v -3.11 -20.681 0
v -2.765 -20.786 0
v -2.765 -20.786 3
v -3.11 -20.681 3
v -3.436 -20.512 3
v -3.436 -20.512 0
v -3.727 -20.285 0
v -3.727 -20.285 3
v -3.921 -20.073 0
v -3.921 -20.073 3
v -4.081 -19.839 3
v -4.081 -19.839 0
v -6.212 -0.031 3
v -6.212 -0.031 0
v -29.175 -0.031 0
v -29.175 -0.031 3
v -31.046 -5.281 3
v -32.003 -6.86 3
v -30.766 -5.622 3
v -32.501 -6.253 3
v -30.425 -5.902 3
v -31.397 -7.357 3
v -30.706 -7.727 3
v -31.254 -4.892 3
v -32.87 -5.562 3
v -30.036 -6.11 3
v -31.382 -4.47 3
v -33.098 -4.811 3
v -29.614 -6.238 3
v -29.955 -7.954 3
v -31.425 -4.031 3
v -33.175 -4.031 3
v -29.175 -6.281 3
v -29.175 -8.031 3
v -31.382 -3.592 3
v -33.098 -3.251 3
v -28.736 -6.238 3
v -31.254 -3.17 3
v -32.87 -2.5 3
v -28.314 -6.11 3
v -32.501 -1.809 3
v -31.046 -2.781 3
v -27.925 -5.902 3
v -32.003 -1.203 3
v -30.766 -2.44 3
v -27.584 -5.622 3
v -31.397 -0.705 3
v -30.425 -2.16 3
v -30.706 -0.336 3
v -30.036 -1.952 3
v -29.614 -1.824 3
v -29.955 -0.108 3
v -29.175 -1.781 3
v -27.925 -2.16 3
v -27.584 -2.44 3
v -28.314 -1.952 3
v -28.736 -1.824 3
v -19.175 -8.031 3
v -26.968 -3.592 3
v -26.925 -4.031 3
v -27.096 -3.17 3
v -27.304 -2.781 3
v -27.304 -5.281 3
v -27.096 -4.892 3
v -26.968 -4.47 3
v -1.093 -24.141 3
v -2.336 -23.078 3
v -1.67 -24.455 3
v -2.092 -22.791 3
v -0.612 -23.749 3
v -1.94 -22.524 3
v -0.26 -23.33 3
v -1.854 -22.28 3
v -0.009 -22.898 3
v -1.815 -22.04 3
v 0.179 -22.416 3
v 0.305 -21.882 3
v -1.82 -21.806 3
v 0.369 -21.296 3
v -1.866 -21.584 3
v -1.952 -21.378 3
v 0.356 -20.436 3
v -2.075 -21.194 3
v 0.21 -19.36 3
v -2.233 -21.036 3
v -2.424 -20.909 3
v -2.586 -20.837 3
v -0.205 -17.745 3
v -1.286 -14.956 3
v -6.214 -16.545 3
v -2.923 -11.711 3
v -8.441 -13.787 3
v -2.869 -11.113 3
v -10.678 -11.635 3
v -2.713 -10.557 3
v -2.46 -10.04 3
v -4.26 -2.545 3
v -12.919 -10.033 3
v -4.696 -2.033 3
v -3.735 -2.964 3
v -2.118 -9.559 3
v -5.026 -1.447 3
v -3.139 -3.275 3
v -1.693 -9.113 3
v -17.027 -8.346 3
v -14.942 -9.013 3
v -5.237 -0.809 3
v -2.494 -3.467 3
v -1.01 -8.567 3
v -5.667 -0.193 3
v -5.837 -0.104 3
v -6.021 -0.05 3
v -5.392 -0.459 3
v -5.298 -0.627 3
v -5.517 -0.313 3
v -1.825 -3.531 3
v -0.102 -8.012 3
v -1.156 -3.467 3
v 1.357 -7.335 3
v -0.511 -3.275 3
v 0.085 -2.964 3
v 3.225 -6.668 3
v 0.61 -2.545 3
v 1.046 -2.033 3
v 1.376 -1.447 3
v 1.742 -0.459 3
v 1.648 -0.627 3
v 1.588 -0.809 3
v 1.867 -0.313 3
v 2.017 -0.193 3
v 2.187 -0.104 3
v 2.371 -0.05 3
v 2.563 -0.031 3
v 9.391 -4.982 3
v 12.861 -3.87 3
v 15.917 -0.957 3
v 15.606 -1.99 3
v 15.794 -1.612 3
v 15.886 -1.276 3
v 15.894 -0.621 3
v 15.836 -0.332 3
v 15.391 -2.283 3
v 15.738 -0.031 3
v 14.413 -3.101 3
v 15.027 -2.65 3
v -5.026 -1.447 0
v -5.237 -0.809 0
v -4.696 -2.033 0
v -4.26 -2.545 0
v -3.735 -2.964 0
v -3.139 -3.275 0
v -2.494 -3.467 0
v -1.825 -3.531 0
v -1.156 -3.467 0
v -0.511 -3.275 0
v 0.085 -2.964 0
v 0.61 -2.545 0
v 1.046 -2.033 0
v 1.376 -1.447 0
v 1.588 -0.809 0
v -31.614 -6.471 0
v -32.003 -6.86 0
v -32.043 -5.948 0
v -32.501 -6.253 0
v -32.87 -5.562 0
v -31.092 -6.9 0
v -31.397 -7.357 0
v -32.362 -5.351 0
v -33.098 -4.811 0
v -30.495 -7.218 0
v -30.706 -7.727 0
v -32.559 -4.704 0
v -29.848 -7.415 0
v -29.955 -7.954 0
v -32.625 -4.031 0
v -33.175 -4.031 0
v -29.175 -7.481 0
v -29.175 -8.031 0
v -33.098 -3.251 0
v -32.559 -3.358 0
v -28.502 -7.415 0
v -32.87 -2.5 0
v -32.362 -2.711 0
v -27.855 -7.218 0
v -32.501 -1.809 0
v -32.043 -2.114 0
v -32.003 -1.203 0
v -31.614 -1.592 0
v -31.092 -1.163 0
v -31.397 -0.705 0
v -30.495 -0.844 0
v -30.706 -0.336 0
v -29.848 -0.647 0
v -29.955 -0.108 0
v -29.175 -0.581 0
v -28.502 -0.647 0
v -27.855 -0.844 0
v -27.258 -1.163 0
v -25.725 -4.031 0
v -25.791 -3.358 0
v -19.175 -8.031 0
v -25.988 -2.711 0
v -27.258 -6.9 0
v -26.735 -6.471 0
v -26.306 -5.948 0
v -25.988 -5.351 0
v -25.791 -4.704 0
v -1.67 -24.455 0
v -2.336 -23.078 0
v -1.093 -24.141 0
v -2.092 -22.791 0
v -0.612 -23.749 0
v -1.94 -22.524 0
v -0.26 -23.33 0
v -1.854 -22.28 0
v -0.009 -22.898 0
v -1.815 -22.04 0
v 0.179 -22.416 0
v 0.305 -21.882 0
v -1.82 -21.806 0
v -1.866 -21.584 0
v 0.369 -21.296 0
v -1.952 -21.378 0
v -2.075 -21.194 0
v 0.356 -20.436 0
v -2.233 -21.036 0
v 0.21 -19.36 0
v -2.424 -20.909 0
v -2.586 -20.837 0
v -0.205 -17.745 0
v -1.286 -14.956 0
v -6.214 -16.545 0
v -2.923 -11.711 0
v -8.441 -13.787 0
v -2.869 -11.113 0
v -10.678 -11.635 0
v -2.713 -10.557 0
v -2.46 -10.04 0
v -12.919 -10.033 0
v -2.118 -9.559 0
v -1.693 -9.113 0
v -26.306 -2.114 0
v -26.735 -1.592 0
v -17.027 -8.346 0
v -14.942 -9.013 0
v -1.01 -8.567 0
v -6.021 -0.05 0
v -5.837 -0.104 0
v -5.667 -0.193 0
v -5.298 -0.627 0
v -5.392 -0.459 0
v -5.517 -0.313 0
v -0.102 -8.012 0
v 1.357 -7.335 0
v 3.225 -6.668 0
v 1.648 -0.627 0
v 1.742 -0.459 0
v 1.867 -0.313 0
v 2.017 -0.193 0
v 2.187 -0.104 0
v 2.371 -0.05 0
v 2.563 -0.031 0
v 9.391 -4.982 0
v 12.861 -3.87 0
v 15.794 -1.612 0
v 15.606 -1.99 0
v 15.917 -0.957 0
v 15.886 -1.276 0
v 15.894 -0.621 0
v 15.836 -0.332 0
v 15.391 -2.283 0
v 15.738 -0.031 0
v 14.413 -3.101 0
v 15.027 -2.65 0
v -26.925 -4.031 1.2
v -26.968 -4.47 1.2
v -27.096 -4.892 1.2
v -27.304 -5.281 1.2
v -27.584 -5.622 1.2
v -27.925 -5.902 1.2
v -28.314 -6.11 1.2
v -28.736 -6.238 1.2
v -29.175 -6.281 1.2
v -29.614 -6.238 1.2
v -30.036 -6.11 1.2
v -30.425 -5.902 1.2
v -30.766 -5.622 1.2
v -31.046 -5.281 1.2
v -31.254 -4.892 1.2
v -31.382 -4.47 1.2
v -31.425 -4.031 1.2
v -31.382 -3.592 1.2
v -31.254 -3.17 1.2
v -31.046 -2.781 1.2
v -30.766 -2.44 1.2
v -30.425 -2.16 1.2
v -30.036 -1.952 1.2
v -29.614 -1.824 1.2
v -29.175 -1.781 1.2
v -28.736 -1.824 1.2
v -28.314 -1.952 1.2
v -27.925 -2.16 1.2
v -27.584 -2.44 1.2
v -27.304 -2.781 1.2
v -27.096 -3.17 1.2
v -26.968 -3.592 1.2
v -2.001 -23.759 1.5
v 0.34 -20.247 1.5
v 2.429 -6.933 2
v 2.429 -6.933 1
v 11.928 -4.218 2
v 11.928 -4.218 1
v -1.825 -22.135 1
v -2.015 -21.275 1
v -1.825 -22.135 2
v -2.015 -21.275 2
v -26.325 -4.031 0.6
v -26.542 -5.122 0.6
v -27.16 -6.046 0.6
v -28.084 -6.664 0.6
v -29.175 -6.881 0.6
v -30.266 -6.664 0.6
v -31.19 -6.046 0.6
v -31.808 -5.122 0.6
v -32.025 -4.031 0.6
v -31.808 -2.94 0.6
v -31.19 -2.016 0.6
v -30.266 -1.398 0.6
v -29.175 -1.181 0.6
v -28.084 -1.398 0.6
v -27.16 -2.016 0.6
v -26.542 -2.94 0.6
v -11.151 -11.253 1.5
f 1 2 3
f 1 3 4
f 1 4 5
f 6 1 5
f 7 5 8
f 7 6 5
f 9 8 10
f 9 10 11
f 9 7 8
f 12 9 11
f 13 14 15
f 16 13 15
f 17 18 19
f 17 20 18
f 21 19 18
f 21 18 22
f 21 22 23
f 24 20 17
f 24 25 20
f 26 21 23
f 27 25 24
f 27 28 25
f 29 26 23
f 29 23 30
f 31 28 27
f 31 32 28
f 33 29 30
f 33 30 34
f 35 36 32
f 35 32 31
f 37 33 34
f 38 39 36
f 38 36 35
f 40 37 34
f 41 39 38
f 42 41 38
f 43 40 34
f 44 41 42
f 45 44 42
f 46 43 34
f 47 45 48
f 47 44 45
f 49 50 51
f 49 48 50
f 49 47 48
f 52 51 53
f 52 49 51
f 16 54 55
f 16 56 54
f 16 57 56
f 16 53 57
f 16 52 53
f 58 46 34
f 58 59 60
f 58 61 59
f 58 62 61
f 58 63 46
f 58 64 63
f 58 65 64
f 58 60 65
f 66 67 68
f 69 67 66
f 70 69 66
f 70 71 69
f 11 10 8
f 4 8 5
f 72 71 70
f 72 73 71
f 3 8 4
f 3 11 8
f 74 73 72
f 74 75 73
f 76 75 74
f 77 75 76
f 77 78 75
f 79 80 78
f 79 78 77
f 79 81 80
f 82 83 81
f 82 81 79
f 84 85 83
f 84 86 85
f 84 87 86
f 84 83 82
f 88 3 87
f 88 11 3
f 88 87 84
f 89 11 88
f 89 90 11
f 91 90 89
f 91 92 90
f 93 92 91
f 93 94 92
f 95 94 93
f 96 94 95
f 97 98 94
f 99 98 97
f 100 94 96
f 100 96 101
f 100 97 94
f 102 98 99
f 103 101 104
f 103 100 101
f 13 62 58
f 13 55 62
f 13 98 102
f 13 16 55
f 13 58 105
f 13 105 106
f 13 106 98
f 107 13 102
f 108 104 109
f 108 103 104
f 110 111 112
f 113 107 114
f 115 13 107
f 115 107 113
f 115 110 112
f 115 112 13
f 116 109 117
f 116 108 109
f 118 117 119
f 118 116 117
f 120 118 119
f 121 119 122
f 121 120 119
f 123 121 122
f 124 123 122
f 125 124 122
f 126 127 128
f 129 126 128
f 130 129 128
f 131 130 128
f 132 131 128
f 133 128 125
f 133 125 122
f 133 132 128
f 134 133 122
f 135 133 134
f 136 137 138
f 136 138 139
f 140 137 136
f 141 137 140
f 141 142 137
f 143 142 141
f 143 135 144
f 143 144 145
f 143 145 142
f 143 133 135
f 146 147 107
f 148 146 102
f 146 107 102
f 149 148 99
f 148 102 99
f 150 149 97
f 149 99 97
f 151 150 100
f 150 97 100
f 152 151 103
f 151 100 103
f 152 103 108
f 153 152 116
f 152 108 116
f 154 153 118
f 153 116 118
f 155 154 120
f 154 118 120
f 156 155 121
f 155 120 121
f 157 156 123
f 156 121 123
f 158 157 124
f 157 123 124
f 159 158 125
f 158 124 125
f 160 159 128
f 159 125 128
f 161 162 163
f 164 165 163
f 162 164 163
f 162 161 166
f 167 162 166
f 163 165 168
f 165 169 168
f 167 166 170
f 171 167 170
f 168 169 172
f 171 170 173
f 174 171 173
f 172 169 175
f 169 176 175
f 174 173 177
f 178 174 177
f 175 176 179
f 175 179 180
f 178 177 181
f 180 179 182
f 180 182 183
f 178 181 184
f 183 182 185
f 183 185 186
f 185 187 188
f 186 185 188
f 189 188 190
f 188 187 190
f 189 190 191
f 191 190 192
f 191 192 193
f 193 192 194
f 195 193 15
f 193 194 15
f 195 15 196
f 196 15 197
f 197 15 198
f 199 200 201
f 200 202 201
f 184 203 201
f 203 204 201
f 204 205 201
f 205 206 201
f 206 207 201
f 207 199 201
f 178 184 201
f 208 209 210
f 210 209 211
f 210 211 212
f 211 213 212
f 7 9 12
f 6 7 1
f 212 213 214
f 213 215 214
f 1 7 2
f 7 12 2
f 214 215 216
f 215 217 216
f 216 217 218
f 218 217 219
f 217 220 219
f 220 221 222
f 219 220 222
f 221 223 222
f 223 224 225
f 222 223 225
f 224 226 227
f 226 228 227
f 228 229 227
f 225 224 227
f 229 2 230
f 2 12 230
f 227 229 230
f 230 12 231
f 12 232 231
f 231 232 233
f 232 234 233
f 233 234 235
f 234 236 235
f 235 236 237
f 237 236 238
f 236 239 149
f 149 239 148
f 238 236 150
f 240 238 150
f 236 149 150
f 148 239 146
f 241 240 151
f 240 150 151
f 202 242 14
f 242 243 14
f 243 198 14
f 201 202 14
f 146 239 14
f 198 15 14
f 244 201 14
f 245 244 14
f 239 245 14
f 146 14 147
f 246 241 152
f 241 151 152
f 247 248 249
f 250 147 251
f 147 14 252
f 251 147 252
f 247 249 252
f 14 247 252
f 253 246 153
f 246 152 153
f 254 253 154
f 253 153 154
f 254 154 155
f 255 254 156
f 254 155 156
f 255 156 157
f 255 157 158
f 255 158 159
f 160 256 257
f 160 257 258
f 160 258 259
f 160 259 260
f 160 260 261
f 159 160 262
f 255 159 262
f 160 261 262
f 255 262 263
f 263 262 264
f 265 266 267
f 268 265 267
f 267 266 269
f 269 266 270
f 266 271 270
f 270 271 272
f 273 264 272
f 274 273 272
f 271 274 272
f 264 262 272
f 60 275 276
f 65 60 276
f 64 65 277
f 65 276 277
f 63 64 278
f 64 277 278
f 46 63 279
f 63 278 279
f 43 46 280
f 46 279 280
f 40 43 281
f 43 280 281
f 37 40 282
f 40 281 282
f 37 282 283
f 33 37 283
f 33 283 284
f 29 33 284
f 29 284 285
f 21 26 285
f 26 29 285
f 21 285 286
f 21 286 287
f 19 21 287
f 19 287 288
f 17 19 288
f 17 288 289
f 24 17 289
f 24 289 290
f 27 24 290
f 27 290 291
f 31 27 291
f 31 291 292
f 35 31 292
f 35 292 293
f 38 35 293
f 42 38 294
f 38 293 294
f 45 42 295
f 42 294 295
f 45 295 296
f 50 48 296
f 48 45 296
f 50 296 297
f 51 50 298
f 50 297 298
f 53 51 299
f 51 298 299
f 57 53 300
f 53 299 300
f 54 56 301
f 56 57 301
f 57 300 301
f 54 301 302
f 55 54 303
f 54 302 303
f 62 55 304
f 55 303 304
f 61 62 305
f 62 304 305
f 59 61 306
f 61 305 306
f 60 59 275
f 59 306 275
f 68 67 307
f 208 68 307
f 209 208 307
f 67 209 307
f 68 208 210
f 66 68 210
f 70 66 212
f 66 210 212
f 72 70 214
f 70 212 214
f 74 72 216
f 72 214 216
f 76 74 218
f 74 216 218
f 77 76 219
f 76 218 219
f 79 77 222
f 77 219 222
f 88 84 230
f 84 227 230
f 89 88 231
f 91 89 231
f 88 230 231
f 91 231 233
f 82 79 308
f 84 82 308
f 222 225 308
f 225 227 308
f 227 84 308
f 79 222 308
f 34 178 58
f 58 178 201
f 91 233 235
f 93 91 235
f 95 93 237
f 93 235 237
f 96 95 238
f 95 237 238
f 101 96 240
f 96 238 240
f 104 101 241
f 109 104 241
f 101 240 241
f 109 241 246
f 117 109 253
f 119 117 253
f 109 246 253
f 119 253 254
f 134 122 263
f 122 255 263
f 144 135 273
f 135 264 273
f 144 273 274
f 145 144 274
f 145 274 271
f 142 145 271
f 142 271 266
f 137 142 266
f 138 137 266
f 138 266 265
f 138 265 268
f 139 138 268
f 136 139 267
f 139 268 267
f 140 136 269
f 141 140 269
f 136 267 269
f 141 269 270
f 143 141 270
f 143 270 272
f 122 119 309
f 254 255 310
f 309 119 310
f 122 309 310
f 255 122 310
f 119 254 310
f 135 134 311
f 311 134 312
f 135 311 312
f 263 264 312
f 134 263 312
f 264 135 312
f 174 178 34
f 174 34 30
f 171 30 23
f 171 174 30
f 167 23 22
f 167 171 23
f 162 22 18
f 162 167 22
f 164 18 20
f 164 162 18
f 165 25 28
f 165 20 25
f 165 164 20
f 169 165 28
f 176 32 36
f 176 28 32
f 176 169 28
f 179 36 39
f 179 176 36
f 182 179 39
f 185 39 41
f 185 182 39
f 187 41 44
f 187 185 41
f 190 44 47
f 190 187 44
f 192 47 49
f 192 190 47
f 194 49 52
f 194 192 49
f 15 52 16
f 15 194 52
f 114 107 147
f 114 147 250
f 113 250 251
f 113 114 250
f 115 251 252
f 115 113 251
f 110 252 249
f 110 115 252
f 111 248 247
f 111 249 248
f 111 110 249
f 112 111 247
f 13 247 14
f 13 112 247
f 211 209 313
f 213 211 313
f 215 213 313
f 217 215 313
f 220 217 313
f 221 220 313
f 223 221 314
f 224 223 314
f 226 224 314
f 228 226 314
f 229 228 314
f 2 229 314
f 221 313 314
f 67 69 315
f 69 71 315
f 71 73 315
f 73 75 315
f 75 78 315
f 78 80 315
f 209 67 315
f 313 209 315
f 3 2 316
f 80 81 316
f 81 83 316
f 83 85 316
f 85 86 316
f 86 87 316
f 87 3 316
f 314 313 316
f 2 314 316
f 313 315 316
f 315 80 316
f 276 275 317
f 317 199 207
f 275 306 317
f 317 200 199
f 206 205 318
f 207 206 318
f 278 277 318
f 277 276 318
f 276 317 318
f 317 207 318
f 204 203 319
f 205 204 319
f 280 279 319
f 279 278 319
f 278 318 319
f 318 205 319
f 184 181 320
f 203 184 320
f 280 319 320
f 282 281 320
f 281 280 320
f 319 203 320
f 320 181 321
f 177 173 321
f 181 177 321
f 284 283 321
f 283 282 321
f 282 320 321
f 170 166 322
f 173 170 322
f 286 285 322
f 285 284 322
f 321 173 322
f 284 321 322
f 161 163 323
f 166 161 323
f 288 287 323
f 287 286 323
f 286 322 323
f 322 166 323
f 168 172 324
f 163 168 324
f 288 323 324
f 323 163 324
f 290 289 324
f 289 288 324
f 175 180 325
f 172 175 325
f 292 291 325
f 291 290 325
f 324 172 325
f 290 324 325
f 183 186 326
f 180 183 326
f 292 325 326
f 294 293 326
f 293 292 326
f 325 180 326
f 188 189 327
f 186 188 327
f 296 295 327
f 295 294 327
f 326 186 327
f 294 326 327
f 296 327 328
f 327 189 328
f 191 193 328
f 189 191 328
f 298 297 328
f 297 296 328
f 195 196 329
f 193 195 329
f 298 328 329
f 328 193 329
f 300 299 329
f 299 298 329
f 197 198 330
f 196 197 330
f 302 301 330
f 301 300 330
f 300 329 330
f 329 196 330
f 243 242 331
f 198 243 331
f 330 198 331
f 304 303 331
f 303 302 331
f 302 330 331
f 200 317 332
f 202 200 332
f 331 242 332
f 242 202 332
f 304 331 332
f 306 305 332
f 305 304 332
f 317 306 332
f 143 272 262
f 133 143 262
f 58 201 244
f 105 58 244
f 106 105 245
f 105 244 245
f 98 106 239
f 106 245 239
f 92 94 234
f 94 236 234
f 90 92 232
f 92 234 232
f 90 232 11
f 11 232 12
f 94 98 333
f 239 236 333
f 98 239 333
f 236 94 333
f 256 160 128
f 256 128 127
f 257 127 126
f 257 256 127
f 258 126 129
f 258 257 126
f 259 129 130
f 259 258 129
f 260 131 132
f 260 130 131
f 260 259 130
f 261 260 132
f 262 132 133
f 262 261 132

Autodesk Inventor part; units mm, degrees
ref_plane "YZ Plane" through (0, 0, 0) normal (1, 0, 0) x (0, 1, 0)
ref_plane "XZ Plane" through (0, 0, 0) normal (0, 1, 0) x (-1, 0, 0)
ref_plane "XY Plane" through (0, 0, 0) normal (0, 0, 1) x (1, 0, 0)
sketch "Sketch1" plane through (0, 0, 0) normal (0, 0, 1) x (1, 0, 0)
  line L0 (15.7385, -0.0311) -> (-29.1749, -0.0311)
  line L1 (-29.1749, -0.0311) -> (2.0558, -0.0311) construction
  line L2 (-29.1749, -8.0311) -> (-19.1749, -8.0311)
  line L3 (-19.1749, -8.0311) -> (-9.0765, -8.6728) construction
  line L4 (-9.0765, -8.6728) -> (-1.6699, -24.4547) construction
  spline S0 degree 2 poles (-19.1749, -8.0311) (-9.0765, -8.6728) (-1.6699, -24.4547) knots 1 1 1 2 2 2
  line L5 (-1.6699, -24.4547) -> (2.9761, -22.4111) construction
  line L6 (2.9761, -22.4111) -> (-2.9231, -11.7108) construction
  spline S1 degree 2 poles (-1.6699, -24.4547) (2.9761, -22.4111) (-2.9231, -11.7108) knots 1 1 1 2 2 2
  line L7 (-2.9231, -11.7108) -> (-2.9231, -4.7242) construction
  line L8 (-2.9231, -4.7242) -> (18.0519, -6.1311) construction
  line L9 (18.0519, -6.1311) -> (15.7385, -0.0311) construction
  spline S2 degree 3 poles (-2.9231, -11.7108) (-2.9231, -4.7242) (18.0519, -6.1311) (15.7385, -0.0311) knots 1 1 1 1 2 2 2 2
  arc A0 (-29.1749, -0.0311) -> (-29.1749, -8.0311) centre (-29.1749, -4.0311) ccw
  circle A1 centre (-29.1749, -4.0311) radius 2.25
  point P0 (0, 0)
  dimension "d0" = 8
  dimension "d1" = 10
  dimension "d2" = 4.5
extrude "Extrusion1" add sketch "Sketch1" along normal blind 3
sketch "Sketch2" plane through (0, 0, 3) normal (0, 0, 1) x (1, 0, 0)
  line L0 (15.7385, -0.0311) -> (-29.1749, -0.0311) projected
  line L1 (-29.1749, -0.0311) -> (-1.8249, -0.0311)
  circle A0 centre (-1.8249, -0.0311) radius 3.5
  point P0 (0, 0)
  dimension "d5" = 27.35
  dimension "d6" = 7
extrude "Extrusion2" cut sketch "Sketch2" against normal blind 3
sketch "Sketch3" plane through (0, 0, 3) normal (0, 0, 1) x (1, 0, 0)
  line L0 (-1.6699, -24.4547) -> (-2.4199, -23.1557)
  line L1 (-1.6699, -24.4547) -> (-0.1699, -24.4547) construction
  line L2 (-3.7341, -20.8795) -> (-2.4199, -23.1557)
  line L3 (-2.4199, -23.1557) -> (-1.13, -22.0176) construction
  line L4 (-1.13, -22.0176) -> (-2.0449, -20.2761) construction
  line L5 (-2.0449, -20.2761) -> (-3.7341, -20.8795) construction
  spline S0 degree 3 poles (-2.4199, -23.1557) (-1.13, -22.0176) (-2.0449, -20.2761) (-3.7341, -20.8795) knots 1 1 1 1 2 2 2 2
  point P0 (0, 0)
  dimension "d9" = 1.5
  dimension "d10" = 120
extrude "Extrusion3" cut sketch "Sketch3" against normal blind 3
fillet "Fillet2" radius 2 1 edges at (-3.5248, -20.8155, 1.5)
chamfer "Chamfer1" distance 1.2 angle 45 1 edges at (-31.4249, -4.0311, 0)
fillet "Fillet4" radius 1 2 edges at (1.6751, -0.0311, 1.5) (-5.3249, -0.0311, 1.5)
properties part number "retreat"
